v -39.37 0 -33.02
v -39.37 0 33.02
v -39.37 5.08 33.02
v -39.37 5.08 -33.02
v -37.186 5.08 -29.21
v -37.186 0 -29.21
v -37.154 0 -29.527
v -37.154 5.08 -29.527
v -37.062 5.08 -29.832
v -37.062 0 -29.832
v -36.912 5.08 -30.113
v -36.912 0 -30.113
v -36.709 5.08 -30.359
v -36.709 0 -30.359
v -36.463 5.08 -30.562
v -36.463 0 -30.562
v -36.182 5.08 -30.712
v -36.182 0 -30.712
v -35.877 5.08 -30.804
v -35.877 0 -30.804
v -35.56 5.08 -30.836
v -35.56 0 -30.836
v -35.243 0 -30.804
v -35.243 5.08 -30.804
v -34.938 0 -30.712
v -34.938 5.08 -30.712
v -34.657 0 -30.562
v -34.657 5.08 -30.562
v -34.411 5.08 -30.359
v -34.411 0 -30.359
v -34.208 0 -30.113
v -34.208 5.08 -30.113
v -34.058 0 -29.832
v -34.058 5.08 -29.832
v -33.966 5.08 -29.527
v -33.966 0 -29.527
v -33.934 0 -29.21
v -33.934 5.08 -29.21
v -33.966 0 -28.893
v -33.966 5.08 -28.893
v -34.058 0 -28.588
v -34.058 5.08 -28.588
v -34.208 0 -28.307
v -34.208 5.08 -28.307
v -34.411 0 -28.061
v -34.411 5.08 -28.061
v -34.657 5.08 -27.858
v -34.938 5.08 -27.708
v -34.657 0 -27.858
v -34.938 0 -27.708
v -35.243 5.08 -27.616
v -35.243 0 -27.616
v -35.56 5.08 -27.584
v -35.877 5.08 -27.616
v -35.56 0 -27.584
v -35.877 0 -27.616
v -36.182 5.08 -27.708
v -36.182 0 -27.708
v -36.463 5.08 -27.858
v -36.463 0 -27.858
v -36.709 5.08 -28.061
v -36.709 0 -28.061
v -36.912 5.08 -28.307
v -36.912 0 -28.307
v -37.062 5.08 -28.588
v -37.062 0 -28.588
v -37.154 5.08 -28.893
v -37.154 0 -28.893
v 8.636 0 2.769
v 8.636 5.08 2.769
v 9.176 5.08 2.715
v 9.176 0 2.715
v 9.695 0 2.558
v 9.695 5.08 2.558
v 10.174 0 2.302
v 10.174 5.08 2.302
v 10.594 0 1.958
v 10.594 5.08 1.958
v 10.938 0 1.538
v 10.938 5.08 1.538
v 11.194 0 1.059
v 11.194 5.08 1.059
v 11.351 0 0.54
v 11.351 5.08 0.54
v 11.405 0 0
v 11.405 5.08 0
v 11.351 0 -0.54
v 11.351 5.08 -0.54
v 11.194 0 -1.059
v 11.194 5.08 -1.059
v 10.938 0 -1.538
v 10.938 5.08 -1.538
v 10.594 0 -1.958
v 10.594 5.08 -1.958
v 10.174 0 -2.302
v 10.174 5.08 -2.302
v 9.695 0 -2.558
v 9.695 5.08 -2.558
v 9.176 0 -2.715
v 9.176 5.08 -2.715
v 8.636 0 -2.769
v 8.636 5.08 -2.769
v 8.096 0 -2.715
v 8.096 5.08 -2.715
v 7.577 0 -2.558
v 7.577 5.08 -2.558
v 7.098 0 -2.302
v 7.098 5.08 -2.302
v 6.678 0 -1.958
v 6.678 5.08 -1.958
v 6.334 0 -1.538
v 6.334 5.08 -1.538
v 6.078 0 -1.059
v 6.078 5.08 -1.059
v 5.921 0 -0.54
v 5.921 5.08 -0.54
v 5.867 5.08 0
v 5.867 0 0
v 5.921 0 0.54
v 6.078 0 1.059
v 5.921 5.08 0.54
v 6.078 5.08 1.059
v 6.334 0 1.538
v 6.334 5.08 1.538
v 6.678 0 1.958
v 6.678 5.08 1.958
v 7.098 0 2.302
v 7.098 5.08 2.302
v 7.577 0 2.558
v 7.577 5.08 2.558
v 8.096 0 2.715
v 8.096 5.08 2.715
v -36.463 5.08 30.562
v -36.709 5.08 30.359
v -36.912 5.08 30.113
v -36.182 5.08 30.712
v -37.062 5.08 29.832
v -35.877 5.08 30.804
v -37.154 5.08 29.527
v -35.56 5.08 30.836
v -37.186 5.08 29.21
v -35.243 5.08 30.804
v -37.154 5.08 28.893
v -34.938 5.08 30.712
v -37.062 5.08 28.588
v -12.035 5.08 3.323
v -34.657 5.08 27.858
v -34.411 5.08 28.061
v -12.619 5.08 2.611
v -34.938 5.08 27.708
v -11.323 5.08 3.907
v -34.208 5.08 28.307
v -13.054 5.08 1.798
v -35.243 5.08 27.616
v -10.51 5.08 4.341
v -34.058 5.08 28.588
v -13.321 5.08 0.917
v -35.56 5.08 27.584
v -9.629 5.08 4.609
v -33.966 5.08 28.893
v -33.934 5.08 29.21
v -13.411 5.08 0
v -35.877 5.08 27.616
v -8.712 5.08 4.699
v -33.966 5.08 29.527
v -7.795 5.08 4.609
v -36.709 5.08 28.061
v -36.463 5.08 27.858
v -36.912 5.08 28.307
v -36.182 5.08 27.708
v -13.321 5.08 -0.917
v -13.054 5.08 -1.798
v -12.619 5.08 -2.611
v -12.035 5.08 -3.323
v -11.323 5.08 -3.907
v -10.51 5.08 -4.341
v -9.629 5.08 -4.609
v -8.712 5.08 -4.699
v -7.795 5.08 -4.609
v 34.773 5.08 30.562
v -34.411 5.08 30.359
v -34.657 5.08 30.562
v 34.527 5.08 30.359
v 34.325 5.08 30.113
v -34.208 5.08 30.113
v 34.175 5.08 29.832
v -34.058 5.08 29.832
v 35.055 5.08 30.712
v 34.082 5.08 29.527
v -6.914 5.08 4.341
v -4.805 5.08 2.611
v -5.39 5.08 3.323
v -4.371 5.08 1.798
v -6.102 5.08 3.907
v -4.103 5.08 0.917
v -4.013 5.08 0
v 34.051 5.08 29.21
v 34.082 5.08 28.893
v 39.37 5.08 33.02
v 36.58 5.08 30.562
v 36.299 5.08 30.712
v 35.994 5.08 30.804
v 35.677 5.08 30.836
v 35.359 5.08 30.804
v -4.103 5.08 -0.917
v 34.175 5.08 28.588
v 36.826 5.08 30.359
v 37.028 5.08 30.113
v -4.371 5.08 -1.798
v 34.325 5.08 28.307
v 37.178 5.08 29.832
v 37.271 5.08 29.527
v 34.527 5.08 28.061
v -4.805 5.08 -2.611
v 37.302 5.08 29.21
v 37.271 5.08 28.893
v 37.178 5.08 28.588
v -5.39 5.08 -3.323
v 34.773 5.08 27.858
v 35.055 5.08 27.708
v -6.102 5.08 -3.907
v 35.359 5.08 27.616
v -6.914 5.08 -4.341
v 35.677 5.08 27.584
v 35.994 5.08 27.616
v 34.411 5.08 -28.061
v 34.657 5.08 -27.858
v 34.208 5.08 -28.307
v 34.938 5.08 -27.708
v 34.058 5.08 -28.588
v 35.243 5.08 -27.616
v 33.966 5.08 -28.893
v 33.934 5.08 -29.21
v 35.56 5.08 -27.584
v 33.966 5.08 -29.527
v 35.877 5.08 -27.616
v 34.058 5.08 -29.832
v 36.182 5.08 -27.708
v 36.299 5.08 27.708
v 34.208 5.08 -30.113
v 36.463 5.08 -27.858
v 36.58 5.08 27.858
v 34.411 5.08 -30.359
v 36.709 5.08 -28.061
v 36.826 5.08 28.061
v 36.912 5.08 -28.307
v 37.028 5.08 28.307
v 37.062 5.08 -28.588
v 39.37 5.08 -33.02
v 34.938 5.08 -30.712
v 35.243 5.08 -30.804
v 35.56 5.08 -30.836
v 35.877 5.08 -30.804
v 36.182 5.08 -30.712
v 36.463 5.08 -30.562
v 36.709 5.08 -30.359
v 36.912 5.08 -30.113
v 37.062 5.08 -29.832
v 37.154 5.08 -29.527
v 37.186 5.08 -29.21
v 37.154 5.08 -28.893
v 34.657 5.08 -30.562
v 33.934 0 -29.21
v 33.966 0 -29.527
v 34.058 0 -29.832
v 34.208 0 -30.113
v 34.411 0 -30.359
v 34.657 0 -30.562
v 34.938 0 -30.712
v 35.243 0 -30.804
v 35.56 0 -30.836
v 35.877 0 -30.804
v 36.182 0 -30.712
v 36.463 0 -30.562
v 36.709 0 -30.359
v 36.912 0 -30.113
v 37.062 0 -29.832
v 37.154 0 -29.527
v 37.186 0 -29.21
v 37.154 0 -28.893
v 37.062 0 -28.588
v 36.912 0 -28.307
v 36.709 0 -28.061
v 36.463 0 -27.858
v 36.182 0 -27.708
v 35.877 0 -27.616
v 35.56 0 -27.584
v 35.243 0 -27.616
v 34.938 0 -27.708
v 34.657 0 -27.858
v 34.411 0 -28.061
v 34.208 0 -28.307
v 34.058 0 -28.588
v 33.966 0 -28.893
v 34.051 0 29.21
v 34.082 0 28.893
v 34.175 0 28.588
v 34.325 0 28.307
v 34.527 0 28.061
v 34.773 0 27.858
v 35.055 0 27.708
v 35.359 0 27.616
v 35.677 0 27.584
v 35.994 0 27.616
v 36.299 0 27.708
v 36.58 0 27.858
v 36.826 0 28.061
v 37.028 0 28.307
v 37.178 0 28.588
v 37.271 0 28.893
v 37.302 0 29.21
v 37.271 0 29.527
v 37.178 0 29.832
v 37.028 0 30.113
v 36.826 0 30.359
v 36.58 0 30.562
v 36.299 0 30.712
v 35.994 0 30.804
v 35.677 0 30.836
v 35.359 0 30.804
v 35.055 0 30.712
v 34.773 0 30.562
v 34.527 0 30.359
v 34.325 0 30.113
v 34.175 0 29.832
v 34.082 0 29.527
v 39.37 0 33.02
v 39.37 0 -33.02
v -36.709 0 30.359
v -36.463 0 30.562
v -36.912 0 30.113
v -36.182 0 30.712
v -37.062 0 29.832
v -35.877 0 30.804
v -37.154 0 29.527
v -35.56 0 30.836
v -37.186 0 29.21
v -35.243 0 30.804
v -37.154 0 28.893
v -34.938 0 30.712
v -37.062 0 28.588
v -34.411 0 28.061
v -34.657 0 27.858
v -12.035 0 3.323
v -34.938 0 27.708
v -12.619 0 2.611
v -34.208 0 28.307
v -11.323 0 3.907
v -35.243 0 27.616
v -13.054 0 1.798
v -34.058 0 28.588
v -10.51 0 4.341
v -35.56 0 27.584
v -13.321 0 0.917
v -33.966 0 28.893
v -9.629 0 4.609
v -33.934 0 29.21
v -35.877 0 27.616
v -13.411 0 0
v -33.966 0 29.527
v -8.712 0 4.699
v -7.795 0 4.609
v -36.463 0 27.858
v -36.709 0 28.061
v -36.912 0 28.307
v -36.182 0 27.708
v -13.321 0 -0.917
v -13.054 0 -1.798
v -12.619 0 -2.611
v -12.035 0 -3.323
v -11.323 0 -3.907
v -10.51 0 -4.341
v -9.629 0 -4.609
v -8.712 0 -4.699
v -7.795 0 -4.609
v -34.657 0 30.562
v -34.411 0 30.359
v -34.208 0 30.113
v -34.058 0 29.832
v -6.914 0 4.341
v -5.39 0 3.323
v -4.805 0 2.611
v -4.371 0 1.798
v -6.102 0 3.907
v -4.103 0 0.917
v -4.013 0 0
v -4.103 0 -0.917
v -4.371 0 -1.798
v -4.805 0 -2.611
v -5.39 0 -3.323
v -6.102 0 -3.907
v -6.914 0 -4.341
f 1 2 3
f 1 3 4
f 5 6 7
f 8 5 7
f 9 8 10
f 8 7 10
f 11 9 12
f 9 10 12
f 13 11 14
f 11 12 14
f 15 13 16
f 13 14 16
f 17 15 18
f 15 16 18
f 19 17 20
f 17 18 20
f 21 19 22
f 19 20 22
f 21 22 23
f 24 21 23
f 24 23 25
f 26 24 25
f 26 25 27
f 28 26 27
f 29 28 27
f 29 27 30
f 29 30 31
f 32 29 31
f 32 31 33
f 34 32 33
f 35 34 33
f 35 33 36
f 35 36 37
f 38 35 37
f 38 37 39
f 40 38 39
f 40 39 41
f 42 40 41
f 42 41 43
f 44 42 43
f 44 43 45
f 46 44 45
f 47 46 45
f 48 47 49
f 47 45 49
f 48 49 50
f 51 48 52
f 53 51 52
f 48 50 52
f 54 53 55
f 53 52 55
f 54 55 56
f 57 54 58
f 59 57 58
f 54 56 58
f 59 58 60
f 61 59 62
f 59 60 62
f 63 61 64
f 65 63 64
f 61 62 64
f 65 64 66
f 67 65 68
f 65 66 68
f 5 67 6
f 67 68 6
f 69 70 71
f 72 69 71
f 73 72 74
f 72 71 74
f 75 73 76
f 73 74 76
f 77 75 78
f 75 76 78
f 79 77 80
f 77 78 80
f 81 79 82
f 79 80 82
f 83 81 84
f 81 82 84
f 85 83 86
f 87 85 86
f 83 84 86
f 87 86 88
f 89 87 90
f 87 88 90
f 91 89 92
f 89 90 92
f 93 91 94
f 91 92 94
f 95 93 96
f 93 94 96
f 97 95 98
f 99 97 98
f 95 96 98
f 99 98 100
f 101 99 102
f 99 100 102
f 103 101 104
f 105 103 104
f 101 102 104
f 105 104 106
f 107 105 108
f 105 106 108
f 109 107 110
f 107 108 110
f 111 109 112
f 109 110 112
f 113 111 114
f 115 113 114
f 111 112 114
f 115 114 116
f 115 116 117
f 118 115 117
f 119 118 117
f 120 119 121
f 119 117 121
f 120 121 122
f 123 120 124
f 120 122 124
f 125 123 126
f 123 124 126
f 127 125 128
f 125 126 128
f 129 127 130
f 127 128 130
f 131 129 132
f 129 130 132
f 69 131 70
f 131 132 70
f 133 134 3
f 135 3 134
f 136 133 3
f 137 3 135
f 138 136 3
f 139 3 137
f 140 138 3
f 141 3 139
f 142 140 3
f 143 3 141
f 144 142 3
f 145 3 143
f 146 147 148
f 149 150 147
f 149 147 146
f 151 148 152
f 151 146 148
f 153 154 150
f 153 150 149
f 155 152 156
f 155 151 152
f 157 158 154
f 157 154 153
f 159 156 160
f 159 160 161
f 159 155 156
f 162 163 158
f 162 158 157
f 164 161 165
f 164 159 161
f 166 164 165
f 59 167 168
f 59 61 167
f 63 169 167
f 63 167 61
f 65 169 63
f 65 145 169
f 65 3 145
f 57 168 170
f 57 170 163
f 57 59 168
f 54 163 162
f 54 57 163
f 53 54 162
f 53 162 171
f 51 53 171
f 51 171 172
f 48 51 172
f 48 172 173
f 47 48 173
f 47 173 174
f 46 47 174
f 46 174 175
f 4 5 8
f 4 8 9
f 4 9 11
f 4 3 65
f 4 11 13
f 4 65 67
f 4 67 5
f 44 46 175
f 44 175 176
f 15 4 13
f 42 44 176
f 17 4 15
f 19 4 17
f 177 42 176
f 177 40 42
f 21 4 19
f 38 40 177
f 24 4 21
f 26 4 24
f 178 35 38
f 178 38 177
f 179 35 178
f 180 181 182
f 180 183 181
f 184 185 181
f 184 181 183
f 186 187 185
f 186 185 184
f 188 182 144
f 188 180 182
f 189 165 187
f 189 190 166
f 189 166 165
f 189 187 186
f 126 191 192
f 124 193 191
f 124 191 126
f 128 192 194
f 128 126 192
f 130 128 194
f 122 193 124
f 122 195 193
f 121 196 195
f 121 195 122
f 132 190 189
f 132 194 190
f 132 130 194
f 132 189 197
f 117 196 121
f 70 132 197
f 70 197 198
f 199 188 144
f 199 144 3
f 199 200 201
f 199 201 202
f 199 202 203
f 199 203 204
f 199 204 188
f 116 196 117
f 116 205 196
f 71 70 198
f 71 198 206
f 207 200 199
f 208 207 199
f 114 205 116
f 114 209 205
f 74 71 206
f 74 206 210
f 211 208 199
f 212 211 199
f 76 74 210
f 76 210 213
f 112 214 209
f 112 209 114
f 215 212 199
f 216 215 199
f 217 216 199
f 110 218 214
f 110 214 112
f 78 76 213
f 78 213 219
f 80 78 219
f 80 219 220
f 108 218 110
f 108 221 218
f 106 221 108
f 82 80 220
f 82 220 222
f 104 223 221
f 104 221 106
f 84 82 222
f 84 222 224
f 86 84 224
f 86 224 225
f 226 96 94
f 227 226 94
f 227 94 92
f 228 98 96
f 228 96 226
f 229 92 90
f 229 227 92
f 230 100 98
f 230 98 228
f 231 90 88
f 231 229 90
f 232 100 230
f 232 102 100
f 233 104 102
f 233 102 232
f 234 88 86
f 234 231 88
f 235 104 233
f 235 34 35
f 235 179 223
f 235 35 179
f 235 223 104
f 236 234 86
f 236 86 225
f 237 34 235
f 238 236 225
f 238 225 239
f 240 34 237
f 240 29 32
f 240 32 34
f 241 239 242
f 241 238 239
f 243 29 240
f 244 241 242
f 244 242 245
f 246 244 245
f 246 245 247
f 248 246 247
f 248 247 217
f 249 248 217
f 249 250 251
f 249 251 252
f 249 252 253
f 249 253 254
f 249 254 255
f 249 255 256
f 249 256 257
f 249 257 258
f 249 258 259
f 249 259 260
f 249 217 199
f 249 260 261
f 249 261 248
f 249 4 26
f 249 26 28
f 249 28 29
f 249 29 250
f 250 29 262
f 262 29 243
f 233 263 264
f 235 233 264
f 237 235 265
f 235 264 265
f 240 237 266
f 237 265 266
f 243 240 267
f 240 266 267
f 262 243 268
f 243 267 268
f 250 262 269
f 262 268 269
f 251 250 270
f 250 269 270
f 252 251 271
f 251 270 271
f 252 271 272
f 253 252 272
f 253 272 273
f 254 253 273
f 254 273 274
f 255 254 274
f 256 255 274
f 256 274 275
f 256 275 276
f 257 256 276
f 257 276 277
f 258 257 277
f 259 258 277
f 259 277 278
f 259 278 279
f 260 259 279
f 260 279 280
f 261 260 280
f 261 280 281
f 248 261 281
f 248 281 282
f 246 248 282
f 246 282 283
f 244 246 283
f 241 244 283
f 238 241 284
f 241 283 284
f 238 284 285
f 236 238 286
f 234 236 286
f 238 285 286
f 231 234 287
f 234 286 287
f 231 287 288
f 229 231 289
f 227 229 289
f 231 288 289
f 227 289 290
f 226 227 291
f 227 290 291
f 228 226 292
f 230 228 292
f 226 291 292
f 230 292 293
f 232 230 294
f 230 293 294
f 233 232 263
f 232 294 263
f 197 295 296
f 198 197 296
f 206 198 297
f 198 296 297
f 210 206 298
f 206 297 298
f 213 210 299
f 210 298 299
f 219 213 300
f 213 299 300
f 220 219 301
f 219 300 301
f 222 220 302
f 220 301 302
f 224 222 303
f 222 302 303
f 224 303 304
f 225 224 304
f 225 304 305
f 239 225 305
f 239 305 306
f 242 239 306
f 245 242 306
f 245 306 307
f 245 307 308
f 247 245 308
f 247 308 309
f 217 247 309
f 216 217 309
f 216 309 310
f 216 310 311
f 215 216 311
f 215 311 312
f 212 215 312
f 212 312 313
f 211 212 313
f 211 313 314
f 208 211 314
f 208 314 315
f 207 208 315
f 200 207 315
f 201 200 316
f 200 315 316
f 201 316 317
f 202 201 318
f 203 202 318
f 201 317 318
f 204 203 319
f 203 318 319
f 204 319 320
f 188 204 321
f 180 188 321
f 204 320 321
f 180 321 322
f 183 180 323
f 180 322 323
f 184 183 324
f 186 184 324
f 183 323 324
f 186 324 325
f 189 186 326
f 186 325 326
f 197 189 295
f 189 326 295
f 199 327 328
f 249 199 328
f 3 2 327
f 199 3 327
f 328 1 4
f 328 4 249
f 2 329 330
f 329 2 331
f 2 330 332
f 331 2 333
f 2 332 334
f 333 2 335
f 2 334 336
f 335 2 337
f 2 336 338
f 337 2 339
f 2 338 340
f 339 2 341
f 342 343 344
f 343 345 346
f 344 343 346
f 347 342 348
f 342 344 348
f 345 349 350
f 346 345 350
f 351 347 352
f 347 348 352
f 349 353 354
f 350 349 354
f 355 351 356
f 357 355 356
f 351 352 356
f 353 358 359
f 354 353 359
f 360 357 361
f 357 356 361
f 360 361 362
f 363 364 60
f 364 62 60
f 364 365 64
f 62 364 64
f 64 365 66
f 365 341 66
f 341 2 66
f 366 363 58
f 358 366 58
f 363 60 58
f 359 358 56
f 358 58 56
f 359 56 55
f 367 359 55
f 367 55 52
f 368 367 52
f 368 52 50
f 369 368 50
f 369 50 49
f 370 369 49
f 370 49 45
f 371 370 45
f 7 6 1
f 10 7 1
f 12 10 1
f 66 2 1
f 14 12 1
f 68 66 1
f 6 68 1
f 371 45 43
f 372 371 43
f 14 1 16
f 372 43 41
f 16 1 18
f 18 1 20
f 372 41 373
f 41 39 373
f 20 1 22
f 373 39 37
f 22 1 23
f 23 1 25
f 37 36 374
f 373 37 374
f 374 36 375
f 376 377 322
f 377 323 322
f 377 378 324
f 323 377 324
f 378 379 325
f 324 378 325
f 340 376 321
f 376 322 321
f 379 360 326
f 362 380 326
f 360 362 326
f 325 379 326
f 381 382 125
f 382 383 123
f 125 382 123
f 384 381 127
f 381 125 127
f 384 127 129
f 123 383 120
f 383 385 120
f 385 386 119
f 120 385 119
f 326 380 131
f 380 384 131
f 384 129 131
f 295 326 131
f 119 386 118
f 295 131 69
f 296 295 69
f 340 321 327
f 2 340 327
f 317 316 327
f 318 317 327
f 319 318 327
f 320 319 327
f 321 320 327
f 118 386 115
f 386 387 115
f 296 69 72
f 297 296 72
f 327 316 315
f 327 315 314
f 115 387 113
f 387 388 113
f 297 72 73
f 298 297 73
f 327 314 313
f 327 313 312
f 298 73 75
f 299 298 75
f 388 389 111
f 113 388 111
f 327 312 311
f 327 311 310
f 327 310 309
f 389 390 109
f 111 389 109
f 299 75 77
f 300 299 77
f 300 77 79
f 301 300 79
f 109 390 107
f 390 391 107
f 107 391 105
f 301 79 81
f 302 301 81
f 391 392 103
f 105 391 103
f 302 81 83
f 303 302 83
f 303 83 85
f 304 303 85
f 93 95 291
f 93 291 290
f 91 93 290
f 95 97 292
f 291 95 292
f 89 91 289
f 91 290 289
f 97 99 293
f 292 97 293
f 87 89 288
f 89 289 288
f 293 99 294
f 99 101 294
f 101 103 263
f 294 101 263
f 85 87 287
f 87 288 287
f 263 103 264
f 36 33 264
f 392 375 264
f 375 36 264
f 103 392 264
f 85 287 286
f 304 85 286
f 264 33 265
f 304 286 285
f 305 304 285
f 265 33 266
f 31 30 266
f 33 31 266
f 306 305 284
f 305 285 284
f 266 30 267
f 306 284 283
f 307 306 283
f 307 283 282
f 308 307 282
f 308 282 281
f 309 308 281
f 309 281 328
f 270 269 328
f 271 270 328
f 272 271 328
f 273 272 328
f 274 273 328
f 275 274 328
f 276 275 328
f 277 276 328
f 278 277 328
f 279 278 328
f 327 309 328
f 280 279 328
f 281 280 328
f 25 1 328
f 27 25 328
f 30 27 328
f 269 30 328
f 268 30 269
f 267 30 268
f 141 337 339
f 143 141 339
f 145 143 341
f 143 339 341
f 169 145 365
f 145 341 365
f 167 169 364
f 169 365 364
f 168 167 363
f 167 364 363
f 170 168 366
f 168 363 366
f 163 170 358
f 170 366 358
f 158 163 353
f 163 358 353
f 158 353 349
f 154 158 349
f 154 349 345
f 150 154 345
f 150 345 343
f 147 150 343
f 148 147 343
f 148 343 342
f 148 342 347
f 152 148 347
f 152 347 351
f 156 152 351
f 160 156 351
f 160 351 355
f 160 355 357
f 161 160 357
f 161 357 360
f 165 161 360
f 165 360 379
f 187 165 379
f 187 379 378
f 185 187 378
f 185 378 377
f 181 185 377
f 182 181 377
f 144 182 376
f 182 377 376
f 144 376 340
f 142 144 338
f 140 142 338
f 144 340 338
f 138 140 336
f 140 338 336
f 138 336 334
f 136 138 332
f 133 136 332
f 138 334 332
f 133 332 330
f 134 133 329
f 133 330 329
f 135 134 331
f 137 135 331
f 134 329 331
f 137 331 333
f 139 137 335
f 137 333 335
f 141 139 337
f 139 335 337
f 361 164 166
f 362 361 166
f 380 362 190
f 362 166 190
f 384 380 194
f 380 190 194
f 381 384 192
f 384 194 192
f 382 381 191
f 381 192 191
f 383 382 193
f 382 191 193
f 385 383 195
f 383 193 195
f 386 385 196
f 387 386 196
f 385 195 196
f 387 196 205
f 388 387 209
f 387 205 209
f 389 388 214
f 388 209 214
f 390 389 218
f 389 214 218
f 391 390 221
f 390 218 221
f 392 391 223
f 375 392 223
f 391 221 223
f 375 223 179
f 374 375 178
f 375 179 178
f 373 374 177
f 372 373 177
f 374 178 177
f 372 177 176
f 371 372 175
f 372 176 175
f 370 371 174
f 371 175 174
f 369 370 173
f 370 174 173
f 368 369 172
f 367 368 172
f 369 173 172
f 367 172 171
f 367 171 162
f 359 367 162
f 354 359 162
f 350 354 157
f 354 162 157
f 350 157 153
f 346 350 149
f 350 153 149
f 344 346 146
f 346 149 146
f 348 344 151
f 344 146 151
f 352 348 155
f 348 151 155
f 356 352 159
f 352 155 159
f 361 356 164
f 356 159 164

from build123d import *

# Parameters (mm, degrees)
SKETCH1_W             = 78.74
SKETCH1_H             = 66.04
BOSS_EXTRUDE1_DEPTH   = 5.08
SKETCH2_R             = 4.699
SKETCH2_R_2           = 2.7686
CUT_EXTRUDE1_DEPTH    = 5.08
F_4_CLEARANCE_HOLE1_D = 3.2512


with BuildPart() as part:
    # Sketch1 → Boss-Extrude1 (new body)
    with BuildSketch(Plane(origin=(0, 0, 0), x_dir=(1, 0, 0), z_dir=(0, 1, 0))):
        Rectangle(SKETCH1_W, SKETCH1_H)
    extrude(amount=BOSS_EXTRUDE1_DEPTH)

    # Sketch2 → Cut-Extrude1 (cut)
    with BuildSketch(Plane(origin=(0, 5.08, 0), x_dir=(1, 0, 0), z_dir=(0, 1, 0))):
        with Locations(Location((-8.7122, 0, 0), (0, 0, 270))):
            Circle(SKETCH2_R)
        with Locations(Location((8.636, 0, 0), (0, 0, 270))):
            Circle(SKETCH2_R_2)
    extrude(amount=-CUT_EXTRUDE1_DEPTH, mode=Mode.SUBTRACT)

    # #4 Clearance Hole1 (through all)
    with Locations(Plane(origin=(0, 5.08, 0), x_dir=(1, 0, 0), z_dir=(0, 1, 0))):
        with Locations((-35.56, 29.21), (-35.56, -29.21), (35.676601494, -29.21), (35.56, 29.21)):
            Hole(F_4_CLEARANCE_HOLE1_D / 2)


solid = part.part
